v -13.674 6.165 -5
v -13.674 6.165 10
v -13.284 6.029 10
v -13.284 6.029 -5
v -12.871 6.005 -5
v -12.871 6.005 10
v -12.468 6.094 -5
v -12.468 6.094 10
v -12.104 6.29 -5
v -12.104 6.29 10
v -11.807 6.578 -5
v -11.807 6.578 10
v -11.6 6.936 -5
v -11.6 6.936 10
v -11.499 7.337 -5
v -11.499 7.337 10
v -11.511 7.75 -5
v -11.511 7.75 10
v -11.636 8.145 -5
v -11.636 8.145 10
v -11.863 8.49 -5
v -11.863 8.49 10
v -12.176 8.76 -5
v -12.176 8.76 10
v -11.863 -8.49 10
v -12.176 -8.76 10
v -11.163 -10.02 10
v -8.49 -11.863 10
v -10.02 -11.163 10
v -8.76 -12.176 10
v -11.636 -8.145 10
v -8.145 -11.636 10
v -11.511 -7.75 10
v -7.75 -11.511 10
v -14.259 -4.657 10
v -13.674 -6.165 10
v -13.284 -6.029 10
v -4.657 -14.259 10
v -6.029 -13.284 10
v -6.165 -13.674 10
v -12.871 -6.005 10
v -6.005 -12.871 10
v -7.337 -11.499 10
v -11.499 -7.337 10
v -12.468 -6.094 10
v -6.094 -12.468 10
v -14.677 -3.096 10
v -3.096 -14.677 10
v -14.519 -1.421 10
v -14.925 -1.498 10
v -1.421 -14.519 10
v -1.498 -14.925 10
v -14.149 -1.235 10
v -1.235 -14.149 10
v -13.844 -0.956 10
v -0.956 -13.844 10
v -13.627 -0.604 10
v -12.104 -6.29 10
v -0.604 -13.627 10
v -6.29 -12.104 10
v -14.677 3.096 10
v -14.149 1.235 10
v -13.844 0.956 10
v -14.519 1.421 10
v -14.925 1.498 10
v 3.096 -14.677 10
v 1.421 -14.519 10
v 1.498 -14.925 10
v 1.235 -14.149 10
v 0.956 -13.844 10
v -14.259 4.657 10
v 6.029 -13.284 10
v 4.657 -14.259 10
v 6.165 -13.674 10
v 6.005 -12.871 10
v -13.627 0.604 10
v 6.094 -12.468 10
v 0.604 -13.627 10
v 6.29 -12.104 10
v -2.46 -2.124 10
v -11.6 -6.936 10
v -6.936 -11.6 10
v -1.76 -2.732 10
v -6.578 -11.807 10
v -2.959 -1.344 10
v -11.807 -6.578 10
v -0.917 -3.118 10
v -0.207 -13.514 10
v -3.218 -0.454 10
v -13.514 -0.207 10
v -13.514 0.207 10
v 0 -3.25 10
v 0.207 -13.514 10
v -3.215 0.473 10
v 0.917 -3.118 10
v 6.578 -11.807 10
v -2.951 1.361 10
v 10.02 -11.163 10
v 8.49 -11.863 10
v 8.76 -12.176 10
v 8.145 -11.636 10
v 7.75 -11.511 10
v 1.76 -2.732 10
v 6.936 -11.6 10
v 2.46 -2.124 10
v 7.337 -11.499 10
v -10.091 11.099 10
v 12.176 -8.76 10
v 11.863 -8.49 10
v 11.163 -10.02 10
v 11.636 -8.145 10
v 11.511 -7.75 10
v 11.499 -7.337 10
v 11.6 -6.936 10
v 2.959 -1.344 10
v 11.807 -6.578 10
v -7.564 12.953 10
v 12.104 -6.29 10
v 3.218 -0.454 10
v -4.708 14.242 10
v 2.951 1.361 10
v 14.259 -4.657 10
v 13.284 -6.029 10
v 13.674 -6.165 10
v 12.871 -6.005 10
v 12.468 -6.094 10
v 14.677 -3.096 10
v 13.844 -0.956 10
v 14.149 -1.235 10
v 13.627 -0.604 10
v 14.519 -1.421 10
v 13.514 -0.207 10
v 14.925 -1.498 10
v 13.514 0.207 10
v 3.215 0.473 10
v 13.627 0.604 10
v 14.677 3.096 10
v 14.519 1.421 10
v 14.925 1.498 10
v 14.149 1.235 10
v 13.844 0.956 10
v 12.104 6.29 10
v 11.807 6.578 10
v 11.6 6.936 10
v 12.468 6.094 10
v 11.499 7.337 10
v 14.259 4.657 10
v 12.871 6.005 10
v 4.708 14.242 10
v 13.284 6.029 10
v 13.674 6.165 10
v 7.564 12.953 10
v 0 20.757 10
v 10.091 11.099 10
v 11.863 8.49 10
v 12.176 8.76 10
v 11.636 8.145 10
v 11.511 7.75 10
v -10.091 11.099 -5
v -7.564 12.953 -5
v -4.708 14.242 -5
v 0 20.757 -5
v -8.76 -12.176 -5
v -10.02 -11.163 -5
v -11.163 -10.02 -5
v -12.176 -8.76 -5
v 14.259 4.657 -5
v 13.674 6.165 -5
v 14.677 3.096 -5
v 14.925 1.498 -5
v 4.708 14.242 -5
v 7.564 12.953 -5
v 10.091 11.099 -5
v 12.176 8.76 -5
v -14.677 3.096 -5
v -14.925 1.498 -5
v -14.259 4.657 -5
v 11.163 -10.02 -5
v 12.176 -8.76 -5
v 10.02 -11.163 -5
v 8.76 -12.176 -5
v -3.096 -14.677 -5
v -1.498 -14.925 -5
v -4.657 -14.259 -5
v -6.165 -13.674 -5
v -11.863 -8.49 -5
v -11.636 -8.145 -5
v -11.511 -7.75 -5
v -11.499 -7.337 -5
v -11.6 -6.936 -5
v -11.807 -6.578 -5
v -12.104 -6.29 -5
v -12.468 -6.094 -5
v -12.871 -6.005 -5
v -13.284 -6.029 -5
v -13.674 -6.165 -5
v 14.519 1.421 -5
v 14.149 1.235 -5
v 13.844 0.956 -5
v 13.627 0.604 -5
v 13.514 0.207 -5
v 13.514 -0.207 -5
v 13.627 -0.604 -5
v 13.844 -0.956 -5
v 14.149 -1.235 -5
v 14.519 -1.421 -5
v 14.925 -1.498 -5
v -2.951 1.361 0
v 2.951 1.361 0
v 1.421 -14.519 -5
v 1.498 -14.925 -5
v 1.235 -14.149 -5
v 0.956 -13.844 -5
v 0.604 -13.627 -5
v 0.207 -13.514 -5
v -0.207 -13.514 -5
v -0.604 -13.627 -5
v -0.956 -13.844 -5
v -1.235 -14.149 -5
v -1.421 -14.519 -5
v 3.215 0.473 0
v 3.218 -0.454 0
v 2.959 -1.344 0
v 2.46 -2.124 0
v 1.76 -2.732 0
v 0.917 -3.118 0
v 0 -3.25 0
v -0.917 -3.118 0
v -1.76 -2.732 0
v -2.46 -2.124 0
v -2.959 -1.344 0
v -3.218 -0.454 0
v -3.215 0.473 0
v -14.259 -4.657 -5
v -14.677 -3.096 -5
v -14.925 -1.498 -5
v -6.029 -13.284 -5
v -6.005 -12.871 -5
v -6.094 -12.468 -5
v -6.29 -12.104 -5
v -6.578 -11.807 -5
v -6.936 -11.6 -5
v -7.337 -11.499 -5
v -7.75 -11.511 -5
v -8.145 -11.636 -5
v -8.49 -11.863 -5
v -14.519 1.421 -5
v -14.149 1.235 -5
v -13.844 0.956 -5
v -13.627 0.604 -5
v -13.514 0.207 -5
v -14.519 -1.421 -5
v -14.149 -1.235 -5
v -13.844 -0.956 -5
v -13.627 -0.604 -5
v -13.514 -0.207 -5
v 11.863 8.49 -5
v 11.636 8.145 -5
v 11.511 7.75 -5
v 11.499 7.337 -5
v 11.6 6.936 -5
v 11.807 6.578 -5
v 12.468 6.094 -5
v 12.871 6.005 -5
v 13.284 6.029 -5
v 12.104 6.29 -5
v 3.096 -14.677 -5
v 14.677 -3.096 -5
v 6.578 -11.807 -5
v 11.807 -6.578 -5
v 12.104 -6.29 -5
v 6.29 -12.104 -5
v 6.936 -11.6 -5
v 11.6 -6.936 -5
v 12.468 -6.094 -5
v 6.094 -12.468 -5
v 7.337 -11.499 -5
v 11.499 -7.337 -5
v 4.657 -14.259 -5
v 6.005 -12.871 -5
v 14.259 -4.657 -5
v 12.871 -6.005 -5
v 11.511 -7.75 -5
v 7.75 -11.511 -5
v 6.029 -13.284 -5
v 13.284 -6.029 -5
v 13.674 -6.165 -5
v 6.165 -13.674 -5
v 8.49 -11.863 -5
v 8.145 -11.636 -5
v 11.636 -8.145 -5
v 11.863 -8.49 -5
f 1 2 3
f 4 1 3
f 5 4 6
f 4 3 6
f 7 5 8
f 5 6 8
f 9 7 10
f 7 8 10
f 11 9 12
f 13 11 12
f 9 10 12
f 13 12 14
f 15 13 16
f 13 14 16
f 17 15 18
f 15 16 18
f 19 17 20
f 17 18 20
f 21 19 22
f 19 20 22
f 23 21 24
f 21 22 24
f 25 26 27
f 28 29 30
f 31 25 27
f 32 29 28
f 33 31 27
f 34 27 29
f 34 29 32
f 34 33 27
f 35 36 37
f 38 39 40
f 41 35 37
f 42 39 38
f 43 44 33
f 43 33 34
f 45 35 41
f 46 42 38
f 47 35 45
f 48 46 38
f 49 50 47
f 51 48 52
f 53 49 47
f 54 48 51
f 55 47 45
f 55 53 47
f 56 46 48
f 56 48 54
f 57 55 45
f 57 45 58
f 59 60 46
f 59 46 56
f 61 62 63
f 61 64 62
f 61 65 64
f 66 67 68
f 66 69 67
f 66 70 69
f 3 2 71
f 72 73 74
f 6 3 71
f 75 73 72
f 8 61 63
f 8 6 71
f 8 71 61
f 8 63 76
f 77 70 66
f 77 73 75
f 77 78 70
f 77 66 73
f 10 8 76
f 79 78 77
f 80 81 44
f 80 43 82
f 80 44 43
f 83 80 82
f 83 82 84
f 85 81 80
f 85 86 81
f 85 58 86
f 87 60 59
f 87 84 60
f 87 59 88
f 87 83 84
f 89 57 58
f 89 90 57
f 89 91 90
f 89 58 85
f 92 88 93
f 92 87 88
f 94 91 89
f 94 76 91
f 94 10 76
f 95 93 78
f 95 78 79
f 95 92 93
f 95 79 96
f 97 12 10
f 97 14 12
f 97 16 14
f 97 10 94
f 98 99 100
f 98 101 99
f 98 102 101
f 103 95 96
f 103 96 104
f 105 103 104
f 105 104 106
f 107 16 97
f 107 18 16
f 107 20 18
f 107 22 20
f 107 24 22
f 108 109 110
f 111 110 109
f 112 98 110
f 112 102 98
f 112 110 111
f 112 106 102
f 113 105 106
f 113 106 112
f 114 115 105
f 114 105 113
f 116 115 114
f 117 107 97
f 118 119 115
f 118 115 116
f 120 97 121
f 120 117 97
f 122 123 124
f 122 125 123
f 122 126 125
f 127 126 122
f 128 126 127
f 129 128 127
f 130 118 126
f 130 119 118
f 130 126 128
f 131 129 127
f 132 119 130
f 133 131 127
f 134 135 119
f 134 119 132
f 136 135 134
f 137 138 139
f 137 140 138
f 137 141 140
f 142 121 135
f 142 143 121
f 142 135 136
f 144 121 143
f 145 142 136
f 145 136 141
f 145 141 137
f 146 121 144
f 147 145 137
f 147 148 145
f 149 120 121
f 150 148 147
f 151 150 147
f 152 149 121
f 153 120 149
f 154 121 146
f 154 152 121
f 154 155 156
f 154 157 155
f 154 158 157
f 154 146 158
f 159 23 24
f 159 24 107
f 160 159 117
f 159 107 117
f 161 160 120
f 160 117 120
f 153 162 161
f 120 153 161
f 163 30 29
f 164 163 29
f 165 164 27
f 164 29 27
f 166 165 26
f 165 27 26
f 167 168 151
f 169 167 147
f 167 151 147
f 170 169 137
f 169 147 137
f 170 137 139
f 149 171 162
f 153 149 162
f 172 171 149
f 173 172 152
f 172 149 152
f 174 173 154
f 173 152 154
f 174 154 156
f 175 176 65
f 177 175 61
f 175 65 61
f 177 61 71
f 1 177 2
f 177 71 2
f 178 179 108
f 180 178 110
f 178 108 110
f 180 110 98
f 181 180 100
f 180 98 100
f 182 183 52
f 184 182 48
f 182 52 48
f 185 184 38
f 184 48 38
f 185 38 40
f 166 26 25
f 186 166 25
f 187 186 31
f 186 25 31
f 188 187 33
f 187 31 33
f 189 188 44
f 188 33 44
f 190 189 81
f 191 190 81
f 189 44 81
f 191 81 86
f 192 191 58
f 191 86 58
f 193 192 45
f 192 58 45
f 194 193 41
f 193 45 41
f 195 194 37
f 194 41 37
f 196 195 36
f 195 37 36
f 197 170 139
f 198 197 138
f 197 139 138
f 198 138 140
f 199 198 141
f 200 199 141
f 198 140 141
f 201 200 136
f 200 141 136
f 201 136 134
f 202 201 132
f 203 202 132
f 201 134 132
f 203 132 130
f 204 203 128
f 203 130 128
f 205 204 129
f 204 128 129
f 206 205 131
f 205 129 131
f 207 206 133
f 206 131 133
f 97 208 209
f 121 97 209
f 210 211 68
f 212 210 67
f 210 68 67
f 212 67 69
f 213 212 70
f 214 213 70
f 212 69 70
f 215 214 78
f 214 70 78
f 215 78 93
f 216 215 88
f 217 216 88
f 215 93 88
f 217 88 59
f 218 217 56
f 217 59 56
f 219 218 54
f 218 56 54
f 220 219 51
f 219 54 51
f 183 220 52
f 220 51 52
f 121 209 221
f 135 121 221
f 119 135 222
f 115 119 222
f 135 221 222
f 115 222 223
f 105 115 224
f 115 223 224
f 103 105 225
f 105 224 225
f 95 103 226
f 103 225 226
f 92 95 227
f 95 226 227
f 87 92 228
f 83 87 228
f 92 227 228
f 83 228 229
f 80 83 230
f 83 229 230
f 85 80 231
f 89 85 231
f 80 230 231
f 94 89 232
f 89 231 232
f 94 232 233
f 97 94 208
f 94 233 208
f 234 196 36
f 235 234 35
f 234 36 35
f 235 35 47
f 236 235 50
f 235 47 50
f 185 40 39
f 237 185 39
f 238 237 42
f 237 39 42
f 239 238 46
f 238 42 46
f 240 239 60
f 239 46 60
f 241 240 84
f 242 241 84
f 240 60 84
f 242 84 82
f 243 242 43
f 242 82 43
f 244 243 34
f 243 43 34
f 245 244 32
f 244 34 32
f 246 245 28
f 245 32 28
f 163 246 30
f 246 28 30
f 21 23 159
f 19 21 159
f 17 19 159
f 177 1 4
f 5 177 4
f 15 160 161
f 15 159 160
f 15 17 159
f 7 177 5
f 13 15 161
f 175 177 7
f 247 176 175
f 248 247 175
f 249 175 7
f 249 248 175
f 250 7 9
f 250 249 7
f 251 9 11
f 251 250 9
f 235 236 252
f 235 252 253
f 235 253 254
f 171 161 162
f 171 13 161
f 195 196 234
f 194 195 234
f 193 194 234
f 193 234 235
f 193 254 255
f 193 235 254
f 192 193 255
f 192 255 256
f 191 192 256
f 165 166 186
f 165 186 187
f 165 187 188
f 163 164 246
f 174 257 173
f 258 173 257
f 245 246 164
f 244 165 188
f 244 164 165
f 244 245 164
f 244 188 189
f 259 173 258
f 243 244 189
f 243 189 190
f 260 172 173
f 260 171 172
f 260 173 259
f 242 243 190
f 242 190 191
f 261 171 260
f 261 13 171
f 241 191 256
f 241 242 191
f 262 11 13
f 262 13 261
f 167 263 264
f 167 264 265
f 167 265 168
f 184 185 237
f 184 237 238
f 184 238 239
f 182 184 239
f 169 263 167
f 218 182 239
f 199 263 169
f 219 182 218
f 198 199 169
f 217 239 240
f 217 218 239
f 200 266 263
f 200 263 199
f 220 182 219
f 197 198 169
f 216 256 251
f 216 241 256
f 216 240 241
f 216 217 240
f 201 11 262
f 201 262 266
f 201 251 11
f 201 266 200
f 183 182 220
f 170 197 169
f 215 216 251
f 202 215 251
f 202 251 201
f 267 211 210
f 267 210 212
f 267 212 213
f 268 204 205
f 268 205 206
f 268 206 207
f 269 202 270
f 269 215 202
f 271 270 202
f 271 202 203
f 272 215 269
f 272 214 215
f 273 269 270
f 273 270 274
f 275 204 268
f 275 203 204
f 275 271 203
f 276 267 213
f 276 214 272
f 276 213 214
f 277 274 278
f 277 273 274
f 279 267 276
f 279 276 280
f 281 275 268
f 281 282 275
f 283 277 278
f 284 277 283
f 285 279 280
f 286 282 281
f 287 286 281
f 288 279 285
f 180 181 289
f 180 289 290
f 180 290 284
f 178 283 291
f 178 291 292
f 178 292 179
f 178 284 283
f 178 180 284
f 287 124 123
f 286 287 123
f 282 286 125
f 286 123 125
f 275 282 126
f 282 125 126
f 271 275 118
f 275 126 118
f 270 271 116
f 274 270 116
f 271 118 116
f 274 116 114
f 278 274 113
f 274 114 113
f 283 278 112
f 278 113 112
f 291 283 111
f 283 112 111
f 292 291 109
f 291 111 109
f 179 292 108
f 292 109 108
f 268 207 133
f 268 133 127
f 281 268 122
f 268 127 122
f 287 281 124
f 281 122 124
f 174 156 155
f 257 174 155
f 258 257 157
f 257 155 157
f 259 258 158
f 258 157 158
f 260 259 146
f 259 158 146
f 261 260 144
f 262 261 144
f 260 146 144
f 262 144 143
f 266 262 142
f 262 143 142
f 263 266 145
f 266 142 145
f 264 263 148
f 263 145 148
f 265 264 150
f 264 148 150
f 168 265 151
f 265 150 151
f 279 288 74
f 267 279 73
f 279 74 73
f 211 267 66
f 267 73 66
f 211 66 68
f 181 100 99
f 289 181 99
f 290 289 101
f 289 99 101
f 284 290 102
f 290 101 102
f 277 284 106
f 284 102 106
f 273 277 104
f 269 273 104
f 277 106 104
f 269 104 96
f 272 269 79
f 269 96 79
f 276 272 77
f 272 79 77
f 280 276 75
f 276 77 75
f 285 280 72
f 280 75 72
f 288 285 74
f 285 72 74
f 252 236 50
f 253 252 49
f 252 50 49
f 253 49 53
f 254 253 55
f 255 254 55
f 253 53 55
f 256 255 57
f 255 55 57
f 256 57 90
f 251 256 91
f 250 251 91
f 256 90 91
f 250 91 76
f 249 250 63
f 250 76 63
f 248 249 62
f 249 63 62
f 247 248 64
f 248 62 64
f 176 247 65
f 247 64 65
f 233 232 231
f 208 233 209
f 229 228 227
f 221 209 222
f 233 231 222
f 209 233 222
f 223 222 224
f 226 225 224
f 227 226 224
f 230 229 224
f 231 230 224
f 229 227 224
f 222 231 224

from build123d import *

# Parameters (mm, degrees)
F0_R     = 15
F1_DEPTH = 10
F2_R     = 15
F3_DEPTH = 5
F5_DEPTH = 15
F6_DEPTH = 15


# Not quite as in the source:
# - a feature names something its author has since deleted; it is built from what else it names


with BuildPart() as f1:
    # F0 (on Top) → F1 (new body)
    with BuildSketch(Plane.XY):
        Circle(F0_R)
        with BuildLine():
            ThreePointArc((2.9510768453, 1.3614864865), (0, -3.25), (-2.9510768453, 1.3614864865))
            Line((-2.9510768453, 1.3614864865), (2.9510768453, 1.3614864865))
        make_face(mode=Mode.SUBTRACT)
    extrude(amount=F1_DEPTH)

    # F2 (on face) → F3 (join)
    with BuildSketch(Plane(origin=(0, 0, 0), x_dir=(1, 0, 0), z_dir=(0, 0, -1))):
        Circle(F2_R)
        with BuildLine():
            ThreePointArc((-2.9510768453, -1.3614864865), (0, 3.25), (2.9510768453, -1.3614864865))
            Line((2.9510768453, -1.3614864865), (-2.9510768453, -1.3614864865))
        make_face(mode=Mode.SUBTRACT)
        with BuildLine():
            Line((-2.9510768453, -1.3614864865), (2.9510768453, -1.3614864865))
            ThreePointArc((2.9510768453, -1.3614864865), (0, 3.25), (-2.9510768453, -1.3614864865))
        make_face()
    extrude(amount=F3_DEPTH)

    # F4 (on face) → F5 (join)
    with BuildSketch(Plane.XY.offset(10)):
        with BuildLine():
            Line((4.707880128, 14.2420456642), (0, 20.7567233592))
            Line((0, 20.7567233592), (-4.707880128, 14.2420456642))
            ThreePointArc((-4.707880128, 14.2420456642), (0, 15), (4.707880128, 14.2420456642))
        make_face()
    extrude(amount=-F5_DEPTH)

    # F4 (on face) → F6 (cut, through all)
    with BuildSketch(Plane.XY.offset(10)):
        with BuildLine():
            ThreePointArc((13.6744910648, 6.1650867081), (12.9903810568, 7.5), (12.1763672382, 8.7599132919))
            ThreePointArc((12.1763672382, 8.7599132919), (11.6913429511, 6.75), (13.6744910648, 6.1650867081))
        make_face()
        with BuildLine():
            ThreePointArc((15, 0), (14.9812382666, 0.75), (14.925, 1.4981238267))
            ThreePointArc((14.925, 1.4981238267), (13.5, 0), (14.925, -1.4981238267))
            ThreePointArc((14.925, -1.4981238267), (14.9812382666, -0.75), (15, 0))
        make_face()
        with BuildLine():
            ThreePointArc((12.1763672382, -8.7599132919), (12.9903810568, -7.5), (13.6744910648, -6.1650867081))
            ThreePointArc((13.6744910648, -6.1650867081), (11.6913429511, -6.75), (12.1763672382, -8.7599132919))
        make_face()
        with BuildLine():
            ThreePointArc((6.1650867081, -13.6744910648), (7.5, -12.9903810568), (8.7599132919, -12.1763672382))
            ThreePointArc((8.7599132919, -12.1763672382), (6.75, -11.6913429511), (6.1650867081, -13.6744910648))
        make_face()
        with BuildLine():
            ThreePointArc((1.4981238267, -14.925), (0, -13.5), (-1.4981238267, -14.925))
            ThreePointArc((-1.4981238267, -14.925), (0, -15), (1.4981238267, -14.925))
        make_face()
        with BuildLine():
            ThreePointArc((-6.1650867081, -13.6744910648), (-6.75, -11.6913429511), (-8.7599132919, -12.1763672382))
            ThreePointArc((-8.7599132919, -12.1763672382), (-7.5, -12.9903810568), (-6.1650867081, -13.6744910648))
        make_face()
        with BuildLine():
            ThreePointArc((-12.1763672382, -8.7599132919), (-11.6913429511, -6.75), (-13.6744910648, -6.1650867081))
            ThreePointArc((-13.6744910648, -6.1650867081), (-12.9903810568, -7.5), (-12.1763672382, -8.7599132919))
        make_face()
        with BuildLine():
            ThreePointArc((-14.925, -1.4981238267), (-13.5, 0), (-14.925, 1.4981238267))
            ThreePointArc((-14.925, 1.4981238267), (-15, 0), (-14.925, -1.4981238267))
        make_face()
        with BuildLine():
            ThreePointArc((-13.6744910648, 6.1650867081), (-11.6913429511, 6.75), (-12.1763672382, 8.7599132919))
            ThreePointArc((-12.1763672382, 8.7599132919), (-12.9903810568, 7.5), (-13.6744910648, 6.1650867081))
        make_face()
    extrude(amount=-F6_DEPTH, mode=Mode.SUBTRACT)


solid = f1.part
